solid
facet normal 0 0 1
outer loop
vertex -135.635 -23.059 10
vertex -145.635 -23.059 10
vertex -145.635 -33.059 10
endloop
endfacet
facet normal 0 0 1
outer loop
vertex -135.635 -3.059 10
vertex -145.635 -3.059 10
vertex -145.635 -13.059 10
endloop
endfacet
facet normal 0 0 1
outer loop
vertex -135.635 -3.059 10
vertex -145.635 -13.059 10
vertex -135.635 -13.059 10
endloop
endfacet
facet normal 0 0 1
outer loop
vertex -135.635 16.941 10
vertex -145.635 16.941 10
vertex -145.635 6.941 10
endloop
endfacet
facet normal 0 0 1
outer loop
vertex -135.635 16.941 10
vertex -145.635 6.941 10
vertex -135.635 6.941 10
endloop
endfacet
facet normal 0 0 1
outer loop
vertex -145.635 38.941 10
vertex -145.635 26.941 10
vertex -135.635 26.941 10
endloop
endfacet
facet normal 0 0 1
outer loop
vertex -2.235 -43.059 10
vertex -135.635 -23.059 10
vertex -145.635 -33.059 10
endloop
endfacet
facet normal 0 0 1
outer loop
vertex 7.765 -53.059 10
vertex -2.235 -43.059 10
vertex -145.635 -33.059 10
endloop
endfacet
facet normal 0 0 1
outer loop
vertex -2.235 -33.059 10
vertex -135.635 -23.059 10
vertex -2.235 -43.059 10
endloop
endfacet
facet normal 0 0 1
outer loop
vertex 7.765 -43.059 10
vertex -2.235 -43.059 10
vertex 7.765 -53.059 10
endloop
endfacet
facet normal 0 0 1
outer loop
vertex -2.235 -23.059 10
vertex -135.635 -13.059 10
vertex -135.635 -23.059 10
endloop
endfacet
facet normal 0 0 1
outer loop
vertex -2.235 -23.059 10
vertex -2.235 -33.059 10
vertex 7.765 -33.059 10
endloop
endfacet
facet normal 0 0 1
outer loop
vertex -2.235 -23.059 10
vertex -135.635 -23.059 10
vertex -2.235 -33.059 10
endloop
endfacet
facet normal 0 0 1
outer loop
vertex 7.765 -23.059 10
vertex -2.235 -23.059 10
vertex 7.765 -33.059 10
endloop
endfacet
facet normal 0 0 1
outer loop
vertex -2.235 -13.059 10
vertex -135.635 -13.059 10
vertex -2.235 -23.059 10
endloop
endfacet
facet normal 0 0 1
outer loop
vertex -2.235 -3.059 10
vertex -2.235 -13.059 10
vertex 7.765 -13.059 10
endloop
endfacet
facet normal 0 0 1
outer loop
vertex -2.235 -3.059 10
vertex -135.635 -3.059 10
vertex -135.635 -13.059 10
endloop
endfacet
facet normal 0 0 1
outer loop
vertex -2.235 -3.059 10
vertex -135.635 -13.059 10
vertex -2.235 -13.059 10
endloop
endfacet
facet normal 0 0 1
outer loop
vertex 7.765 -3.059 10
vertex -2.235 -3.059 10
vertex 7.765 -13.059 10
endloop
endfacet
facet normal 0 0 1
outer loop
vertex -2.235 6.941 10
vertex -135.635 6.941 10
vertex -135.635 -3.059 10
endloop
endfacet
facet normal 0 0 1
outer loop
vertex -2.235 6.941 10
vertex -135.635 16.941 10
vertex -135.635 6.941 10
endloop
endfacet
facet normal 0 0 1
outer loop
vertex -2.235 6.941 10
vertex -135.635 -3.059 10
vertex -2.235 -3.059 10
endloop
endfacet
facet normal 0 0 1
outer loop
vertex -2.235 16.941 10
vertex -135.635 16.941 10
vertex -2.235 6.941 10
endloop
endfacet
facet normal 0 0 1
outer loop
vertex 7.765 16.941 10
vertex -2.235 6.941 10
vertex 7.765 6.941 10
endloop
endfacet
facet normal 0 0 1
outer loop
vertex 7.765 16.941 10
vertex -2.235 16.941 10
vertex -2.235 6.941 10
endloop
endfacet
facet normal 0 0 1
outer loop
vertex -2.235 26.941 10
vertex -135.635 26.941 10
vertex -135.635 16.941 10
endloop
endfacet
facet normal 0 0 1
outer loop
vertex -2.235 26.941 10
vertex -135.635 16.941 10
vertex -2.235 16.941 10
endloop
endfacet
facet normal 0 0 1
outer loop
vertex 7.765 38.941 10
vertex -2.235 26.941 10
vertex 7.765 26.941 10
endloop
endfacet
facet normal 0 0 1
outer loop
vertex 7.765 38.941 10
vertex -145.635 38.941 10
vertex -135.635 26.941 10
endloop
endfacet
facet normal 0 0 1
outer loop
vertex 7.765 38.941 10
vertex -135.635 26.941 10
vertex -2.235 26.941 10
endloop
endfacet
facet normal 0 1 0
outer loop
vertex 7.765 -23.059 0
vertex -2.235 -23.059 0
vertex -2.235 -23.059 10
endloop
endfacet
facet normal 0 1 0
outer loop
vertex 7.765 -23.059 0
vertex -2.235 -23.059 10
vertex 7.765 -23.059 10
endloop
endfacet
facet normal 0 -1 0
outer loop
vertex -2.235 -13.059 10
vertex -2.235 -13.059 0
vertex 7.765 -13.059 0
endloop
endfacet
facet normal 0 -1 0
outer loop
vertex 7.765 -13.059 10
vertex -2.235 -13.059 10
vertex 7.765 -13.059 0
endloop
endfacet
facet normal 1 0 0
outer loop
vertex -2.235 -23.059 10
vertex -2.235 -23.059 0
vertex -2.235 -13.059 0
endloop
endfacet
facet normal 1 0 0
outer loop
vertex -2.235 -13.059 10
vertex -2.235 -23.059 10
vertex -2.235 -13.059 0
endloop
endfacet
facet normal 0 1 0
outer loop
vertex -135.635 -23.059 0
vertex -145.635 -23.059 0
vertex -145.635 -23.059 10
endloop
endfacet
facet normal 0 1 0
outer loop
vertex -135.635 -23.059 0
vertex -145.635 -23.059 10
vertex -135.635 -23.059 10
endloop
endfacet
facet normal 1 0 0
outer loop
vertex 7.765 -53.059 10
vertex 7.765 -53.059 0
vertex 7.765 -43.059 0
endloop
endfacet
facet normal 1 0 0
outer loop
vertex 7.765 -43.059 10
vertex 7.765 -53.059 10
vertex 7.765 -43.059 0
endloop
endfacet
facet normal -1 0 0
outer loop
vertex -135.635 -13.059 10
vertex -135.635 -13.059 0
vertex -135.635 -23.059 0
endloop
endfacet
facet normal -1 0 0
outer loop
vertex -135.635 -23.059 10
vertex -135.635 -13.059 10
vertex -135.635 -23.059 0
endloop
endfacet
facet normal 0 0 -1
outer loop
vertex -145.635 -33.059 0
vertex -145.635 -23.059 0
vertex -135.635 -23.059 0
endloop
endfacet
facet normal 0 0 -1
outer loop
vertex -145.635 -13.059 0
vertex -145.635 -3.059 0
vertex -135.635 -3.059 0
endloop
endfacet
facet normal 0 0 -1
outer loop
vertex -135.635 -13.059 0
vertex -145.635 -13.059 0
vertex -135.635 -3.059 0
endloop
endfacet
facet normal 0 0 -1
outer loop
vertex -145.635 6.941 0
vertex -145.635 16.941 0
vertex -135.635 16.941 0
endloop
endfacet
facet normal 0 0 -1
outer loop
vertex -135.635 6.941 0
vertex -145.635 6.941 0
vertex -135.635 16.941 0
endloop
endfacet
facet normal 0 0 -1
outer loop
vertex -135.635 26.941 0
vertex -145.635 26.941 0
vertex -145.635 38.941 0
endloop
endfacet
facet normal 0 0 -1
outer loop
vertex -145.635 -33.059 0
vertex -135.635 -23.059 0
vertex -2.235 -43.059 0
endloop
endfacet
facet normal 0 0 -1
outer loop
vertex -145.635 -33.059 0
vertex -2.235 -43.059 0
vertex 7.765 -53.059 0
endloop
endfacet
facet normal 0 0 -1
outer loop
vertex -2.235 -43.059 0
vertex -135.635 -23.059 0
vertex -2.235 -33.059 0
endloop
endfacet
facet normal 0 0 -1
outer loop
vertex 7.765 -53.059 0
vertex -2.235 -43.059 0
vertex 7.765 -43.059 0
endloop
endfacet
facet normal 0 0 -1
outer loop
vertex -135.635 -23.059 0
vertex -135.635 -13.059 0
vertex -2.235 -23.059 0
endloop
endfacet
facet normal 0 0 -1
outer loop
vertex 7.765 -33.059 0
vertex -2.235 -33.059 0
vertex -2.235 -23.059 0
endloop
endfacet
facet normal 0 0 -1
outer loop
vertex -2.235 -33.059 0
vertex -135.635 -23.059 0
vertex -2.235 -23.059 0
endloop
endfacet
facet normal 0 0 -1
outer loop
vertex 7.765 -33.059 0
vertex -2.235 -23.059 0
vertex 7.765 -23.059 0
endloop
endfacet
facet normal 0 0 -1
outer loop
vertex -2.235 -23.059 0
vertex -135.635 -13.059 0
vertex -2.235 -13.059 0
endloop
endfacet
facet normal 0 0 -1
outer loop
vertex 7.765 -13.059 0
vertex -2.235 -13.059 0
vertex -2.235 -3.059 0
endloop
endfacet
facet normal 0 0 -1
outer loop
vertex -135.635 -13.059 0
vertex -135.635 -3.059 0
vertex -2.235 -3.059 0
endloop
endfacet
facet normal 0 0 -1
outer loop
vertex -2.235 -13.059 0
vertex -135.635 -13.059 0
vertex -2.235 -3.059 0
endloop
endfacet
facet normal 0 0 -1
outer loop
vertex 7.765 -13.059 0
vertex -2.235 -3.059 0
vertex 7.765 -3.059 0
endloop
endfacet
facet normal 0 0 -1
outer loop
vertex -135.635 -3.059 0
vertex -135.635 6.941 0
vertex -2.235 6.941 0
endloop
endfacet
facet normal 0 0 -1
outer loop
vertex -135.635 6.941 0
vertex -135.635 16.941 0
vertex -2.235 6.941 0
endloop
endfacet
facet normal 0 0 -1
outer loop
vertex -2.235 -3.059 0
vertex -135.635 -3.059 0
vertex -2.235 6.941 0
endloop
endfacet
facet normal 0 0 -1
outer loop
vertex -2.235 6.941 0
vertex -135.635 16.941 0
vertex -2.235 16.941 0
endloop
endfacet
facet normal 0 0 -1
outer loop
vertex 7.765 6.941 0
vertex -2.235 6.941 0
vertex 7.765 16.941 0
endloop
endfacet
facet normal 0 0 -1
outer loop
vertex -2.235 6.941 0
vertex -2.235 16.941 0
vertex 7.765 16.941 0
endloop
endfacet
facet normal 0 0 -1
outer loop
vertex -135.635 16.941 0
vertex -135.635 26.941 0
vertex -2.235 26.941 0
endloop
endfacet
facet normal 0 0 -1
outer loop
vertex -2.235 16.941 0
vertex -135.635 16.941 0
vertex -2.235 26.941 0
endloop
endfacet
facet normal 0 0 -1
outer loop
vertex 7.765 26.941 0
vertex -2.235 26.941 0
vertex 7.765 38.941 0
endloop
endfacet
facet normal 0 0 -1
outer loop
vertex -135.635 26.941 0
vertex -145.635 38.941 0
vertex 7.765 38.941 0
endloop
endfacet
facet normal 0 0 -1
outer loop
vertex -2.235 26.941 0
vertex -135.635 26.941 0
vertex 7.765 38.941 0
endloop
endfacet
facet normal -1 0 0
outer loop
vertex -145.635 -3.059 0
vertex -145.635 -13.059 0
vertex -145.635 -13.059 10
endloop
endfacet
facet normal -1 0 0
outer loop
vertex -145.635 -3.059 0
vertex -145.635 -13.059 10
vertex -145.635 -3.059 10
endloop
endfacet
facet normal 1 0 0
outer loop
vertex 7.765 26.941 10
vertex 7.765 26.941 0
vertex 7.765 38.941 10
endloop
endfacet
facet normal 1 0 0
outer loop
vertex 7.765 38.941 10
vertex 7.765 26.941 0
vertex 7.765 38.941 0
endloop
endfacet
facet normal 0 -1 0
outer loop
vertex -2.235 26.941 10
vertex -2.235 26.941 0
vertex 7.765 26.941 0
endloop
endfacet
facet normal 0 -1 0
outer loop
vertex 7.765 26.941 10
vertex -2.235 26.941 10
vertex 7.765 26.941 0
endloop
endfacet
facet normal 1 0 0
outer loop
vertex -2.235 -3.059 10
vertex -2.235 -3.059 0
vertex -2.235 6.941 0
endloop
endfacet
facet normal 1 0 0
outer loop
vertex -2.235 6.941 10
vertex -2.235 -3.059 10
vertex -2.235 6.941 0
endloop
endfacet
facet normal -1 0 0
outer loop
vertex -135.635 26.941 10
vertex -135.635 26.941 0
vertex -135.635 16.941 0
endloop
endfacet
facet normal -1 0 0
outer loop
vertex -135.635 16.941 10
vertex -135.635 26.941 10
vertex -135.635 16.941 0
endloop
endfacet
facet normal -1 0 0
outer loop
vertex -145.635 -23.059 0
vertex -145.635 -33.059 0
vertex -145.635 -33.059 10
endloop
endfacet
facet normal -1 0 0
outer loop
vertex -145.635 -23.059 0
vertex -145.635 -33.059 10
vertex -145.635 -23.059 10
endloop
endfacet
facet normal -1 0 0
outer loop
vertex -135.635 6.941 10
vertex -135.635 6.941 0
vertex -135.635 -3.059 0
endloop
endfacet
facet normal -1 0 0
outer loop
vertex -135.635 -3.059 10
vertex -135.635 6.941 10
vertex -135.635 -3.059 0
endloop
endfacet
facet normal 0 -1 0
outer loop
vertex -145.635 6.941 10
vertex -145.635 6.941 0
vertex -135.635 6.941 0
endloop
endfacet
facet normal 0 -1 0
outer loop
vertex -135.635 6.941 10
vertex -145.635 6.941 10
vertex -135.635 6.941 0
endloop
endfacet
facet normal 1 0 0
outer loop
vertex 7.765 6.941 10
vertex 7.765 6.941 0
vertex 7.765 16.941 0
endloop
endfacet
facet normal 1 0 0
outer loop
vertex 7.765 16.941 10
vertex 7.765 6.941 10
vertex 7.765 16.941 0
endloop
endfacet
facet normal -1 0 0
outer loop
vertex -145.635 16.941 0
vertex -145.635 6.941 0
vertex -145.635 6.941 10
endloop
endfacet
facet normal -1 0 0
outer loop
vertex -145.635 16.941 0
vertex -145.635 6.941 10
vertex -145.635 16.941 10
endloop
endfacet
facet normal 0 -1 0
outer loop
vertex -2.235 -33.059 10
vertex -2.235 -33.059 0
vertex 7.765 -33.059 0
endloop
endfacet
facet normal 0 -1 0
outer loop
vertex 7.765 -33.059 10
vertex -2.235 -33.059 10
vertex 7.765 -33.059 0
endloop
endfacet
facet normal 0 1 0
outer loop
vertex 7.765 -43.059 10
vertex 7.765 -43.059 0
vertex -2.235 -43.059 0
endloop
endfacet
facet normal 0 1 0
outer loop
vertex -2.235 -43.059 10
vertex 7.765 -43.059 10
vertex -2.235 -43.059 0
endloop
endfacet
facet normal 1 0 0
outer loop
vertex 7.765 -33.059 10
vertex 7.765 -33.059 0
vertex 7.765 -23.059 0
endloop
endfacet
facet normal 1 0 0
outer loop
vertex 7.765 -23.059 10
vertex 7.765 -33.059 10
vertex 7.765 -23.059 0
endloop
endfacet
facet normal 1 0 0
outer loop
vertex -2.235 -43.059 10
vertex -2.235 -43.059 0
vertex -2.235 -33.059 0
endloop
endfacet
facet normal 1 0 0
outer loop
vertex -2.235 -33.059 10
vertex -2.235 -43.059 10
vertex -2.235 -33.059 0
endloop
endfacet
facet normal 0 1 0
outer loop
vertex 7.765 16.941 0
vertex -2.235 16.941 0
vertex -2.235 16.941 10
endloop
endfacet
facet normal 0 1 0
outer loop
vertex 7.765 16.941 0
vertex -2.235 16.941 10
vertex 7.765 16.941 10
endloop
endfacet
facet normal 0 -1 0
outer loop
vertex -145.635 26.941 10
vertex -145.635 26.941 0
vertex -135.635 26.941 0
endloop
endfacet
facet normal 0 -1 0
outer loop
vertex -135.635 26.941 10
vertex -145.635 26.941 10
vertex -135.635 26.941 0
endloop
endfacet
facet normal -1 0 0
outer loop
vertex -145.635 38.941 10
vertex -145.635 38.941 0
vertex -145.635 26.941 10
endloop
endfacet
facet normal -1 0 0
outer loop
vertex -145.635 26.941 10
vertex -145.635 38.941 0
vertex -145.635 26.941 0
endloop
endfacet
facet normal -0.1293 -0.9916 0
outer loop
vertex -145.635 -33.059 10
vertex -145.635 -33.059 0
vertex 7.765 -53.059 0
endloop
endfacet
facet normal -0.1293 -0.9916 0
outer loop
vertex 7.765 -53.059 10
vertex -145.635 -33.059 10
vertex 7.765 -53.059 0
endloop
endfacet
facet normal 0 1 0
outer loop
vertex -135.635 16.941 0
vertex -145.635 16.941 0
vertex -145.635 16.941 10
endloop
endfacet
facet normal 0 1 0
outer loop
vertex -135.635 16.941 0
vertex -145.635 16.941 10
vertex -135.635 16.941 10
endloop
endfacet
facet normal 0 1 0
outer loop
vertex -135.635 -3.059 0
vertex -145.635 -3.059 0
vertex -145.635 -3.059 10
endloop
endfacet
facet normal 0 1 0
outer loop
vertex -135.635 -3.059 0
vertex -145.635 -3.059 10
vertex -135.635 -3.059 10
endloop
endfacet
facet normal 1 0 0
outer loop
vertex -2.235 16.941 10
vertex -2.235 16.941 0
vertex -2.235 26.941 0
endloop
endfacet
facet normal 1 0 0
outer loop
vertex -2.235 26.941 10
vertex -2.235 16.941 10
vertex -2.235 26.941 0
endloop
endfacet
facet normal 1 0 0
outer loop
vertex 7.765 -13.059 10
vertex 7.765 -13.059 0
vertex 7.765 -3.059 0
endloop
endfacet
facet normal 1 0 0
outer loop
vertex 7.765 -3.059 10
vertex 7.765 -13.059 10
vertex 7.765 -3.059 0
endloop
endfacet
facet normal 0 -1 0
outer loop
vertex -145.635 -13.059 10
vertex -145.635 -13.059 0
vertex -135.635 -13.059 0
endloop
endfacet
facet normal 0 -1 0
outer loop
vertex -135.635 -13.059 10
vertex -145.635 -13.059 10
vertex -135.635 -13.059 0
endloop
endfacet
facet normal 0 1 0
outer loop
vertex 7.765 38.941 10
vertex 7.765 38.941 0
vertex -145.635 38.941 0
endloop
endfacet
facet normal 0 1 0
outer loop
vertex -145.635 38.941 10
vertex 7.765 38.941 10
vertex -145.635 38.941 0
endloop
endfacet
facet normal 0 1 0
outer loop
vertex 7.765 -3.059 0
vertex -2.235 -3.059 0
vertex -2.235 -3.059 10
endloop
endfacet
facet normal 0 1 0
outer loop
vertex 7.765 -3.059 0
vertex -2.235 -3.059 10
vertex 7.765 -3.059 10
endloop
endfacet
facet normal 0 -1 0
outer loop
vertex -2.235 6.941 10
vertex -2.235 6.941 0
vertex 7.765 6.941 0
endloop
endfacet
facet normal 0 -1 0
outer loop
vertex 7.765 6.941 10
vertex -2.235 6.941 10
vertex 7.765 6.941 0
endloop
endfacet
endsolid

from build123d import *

# Parameters (mm, degrees)
F0_W     = 10
F0_H     = 10
F1_DEPTH = 10


# Not quite as in the source:
# - a feature names something its author has since deleted; it is built from what else it names


with BuildPart() as f1:
    # F0 (on Top) → F1 (new body)
    with BuildSketch(Plane.XY):
        Polygon((-2.2346749902, 36.9413525529), (-135.6346749902, 36.9413525529), (-135.6346749902, 26.9413525529), (-135.6346749902, 16.9413525529), (-135.6346749902, 6.9413525529), (-135.6346749902, -3.0586474471), (-135.6346749902, -13.0586474471), (-135.6346749902, -23.0586474471), (-135.6346749902, -33.0586474471), (-2.2346749902, -33.0586474471), (-2.2346749902, -23.0586474471), (-2.2346749902, -13.0586474471), (-2.2346749902, -3.0586474471), (-2.2346749902, 6.9413525529), (-2.2346749902, 16.9413525529), (-2.2346749902, 26.9413525529), align=None)
        with Locations((-140.6346749902, 31.9413525529)):
            Rectangle(F0_W, F0_H)
        with Locations((-140.6346749902, 11.9413525529)):
            Rectangle(F0_W, F0_H)
        with Locations((-140.6346749902, -8.0586474471)):
            Rectangle(F0_W, F0_H)
        with Locations((-140.6346749902, -28.0586474471)):
            Rectangle(F0_W, F0_H)
        with Locations((2.7653250098, 31.9413525529)):
            Rectangle(F0_W, F0_H)
        with Locations((2.7653250098, 11.9413525529)):
            Rectangle(F0_W, F0_H)
        with Locations((2.7653250098, -8.0586474471)):
            Rectangle(F0_W, F0_H)
        with Locations((2.7653250098, -28.0586474471)):
            Rectangle(F0_W, F0_H)
        Polygon((-135.6346749902, -33.0586474471), (-145.6346749902, -33.0586474471), (-2.2346749902, -51.7548664823), (-2.2346749902, -43.0586474471), (-2.2346749902, -33.0586474471), align=None)
        Polygon((-2.2346749902, -43.0586474471), (-2.2346749902, -51.7548664823), (7.7653250098, -53.0586474471), (7.7653250098, -43.0586474471), align=None)
        Polygon((-145.6346749902, 38.9413525529), (-145.6346749902, 36.9413525529), (-135.6346749902, 36.9413525529), (-2.2346749902, 36.9413525529), (7.7653250098, 36.9413525529), (7.7653250098, 38.9413525529), align=None)
    extrude(amount=F1_DEPTH)


solid = f1.part
